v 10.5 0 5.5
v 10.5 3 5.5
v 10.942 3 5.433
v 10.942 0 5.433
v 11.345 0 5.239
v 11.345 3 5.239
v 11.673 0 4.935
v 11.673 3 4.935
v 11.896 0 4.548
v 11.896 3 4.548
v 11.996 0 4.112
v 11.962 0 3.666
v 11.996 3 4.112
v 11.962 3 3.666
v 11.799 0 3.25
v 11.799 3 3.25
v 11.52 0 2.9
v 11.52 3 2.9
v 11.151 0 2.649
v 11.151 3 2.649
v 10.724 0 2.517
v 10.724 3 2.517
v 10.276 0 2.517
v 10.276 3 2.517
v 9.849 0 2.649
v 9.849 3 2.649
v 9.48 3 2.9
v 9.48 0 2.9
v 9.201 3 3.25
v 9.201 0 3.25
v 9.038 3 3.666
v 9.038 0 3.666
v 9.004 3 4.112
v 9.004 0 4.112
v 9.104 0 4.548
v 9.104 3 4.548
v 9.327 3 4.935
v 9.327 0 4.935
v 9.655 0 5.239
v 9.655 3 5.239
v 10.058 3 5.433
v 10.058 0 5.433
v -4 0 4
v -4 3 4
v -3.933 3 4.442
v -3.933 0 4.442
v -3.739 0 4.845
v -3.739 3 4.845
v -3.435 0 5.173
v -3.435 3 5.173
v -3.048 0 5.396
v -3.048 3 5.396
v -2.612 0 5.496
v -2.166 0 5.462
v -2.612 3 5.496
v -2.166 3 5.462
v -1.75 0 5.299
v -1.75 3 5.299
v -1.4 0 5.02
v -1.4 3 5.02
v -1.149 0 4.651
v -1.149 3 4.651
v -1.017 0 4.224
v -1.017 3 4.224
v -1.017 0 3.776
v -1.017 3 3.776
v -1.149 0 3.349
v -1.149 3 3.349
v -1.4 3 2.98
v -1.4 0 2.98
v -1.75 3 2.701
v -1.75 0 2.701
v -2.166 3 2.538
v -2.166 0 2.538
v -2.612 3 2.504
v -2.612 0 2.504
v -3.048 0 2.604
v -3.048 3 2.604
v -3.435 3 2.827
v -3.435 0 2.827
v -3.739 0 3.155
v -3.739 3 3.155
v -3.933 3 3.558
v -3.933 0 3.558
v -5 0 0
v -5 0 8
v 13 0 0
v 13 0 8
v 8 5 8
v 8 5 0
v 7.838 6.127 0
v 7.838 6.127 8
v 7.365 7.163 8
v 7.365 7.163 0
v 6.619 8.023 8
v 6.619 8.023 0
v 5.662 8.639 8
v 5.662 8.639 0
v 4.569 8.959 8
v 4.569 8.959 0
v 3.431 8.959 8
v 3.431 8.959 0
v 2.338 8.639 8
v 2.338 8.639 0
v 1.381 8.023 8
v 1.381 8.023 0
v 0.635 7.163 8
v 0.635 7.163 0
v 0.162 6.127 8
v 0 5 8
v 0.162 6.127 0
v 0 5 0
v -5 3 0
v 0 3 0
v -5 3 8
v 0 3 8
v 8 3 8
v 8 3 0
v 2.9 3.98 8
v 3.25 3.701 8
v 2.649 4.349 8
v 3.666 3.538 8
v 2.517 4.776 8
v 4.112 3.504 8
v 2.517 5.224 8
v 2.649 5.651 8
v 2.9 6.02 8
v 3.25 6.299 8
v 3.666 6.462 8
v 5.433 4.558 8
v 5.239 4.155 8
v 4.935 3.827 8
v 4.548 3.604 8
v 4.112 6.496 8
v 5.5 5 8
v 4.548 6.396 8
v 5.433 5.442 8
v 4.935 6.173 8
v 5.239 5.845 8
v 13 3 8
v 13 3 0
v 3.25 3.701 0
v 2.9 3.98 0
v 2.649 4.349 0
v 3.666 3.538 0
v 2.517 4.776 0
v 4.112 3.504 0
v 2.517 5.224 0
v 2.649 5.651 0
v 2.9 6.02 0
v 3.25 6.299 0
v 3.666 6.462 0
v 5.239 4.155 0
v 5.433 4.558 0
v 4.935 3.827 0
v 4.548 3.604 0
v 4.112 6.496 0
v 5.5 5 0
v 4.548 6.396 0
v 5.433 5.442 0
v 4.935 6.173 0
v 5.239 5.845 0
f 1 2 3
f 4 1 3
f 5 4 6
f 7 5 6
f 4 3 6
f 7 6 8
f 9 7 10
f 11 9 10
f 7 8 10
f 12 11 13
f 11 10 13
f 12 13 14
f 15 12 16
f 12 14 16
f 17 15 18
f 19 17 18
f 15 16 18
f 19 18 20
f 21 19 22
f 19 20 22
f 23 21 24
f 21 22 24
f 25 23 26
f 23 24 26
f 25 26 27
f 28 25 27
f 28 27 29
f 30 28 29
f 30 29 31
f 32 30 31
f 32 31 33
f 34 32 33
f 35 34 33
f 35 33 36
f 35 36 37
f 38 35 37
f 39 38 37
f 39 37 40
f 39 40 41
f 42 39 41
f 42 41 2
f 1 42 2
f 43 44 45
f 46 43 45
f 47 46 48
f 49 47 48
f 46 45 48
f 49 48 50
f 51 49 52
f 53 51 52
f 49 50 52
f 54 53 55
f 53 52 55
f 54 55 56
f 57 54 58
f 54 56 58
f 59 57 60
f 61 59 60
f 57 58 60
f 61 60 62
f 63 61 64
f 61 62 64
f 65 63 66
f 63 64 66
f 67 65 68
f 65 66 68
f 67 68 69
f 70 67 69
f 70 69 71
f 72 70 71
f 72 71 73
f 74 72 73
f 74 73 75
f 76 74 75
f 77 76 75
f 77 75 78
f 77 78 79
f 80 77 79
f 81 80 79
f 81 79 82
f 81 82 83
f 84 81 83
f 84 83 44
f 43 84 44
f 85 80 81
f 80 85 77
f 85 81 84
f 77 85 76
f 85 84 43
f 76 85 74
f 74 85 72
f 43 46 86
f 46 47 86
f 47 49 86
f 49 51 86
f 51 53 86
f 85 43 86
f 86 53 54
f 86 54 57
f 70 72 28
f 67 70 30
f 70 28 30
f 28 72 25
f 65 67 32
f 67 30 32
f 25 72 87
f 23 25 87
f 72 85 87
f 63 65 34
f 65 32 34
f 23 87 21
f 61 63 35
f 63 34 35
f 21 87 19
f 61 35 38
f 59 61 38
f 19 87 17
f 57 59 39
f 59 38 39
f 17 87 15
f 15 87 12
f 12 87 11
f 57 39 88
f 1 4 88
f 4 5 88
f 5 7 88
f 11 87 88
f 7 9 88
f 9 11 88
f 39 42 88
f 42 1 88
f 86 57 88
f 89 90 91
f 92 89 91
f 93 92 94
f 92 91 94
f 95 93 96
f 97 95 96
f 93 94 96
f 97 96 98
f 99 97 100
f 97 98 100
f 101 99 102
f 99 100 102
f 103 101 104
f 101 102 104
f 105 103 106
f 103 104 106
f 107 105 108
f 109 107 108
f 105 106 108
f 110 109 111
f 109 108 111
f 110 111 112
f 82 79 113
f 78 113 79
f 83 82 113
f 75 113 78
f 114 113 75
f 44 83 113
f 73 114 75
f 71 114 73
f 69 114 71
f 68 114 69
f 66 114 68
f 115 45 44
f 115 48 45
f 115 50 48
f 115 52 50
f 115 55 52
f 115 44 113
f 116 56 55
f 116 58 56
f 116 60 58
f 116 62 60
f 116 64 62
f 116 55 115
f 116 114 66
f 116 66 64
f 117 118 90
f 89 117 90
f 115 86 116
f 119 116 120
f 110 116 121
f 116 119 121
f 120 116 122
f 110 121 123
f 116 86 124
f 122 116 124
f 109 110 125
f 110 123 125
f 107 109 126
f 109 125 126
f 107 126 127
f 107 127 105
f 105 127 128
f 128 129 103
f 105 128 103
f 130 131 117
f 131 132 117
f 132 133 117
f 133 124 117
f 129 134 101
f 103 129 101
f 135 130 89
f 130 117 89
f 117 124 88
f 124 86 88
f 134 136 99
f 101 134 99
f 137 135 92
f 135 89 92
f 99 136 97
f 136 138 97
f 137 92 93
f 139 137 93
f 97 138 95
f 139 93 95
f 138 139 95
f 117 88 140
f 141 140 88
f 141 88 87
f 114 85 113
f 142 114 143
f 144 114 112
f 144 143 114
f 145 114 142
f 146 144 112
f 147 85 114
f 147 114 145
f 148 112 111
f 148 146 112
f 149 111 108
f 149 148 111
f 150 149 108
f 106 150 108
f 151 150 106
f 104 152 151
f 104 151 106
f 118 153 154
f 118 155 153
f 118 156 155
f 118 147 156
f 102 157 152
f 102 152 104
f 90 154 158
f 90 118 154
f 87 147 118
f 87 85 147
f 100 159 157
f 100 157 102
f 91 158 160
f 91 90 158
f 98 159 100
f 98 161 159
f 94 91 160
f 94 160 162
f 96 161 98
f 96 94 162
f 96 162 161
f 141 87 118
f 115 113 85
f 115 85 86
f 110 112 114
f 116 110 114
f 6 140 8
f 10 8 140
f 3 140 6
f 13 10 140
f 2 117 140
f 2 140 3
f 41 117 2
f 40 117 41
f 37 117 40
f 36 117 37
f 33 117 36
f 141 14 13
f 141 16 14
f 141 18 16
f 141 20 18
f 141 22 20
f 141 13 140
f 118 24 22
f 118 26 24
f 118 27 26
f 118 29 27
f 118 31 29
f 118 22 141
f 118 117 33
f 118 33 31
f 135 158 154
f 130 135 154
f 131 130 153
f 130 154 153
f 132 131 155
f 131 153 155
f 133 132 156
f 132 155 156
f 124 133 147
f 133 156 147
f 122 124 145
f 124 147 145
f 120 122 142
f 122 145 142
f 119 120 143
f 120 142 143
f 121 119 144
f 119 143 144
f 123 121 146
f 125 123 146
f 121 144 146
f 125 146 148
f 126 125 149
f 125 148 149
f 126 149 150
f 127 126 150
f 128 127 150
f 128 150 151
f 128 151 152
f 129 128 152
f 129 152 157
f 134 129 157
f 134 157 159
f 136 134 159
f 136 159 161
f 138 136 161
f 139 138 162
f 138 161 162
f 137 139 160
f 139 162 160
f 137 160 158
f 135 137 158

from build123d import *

# Parameters (mm, degrees)
BOSS_EXTRUDE1_DEPTH = 8
SKETCH2_W           = 8
SKETCH2_H           = 3
BOSS_EXTRUDE2_DEPTH = 5
CUT_EXTRUDE1_REACH  = 18.401
SKETCH3_R           = 1.5
SKETCH4_W           = 8
SKETCH4_H           = 3
BOSS_EXTRUDE3_DEPTH = 5
CUT_EXTRUDE2_REACH  = 18.401
SKETCH5_R           = 1.5


with BuildPart() as part:
    # Sketch1 → Boss-Extrude1 (new body)
    with BuildSketch(Plane.XY):
        with BuildLine():
            ThreePointArc((8, 5), (4, 9), (0, 5))
            Line((0, 5), (2.5, 5))
            ThreePointArc((2.5, 5), (4, 6.5), (5.5, 5))
            Line((5.5, 5), (8, 5))
        make_face()
        with BuildLine():
            Line((2.5, 5), (0, 5))
            ThreePointArc((0, 5), (4, 1), (8, 5))
            Line((8, 5), (5.5, 5))
            ThreePointArc((5.5, 5), (4, 3.5), (2.5, 5))
        make_face()
        with BuildLine():
            Line((0, 5), (0, 0))
            Line((0, 0), (8, 0))
            Line((8, 0), (8, 5))
            ThreePointArc((8, 5), (4, 1), (0, 5))
        make_face()
    extrude(amount=BOSS_EXTRUDE1_DEPTH)

    # Sketch2 → Boss-Extrude2 (add)
    with BuildSketch(Plane(origin=(8, 0, 0), x_dir=(0, 0, -1), z_dir=(1, 0, 0))):
        with Locations((-4, 1.5)):
            Rectangle(SKETCH2_W, SKETCH2_H)
    extrude(amount=BOSS_EXTRUDE2_DEPTH)

    # Sketch3 → Cut-Extrude1 (cut, up to next)
    with BuildSketch(Plane(origin=(0, 3, 0), x_dir=(1, 0, 0), z_dir=(0, 1, 0)), mode=Mode.PRIVATE) as cut_extrude1_sk1:
        with Locations(Location((10.5, -4, 0), (0, 0, 270))):
            Circle(SKETCH3_R)
    cut_extrude1_tool1 = extrude(cut_extrude1_sk1.sketch, amount=-CUT_EXTRUDE1_REACH, mode=Mode.PRIVATE) & part.part
    add(cut_extrude1_tool1.solids().sort_by_distance((10.5, 3, 4))[0], mode=Mode.SUBTRACT)

    # Sketch4 → Boss-Extrude3 (add)
    with BuildSketch(Plane.ZY):
        with Locations((4, 1.5)):
            Rectangle(SKETCH4_W, SKETCH4_H)
    extrude(amount=BOSS_EXTRUDE3_DEPTH)

    # Sketch5 → Cut-Extrude2 (cut, up to next)
    with BuildSketch(Plane(origin=(0, 3, 0), x_dir=(1, 0, 0), z_dir=(0, 1, 0)), mode=Mode.PRIVATE) as cut_extrude2_sk1:
        with Locations(Location((-2.5, -4, 0), (0, 0, 180))):
            Circle(SKETCH5_R)
    cut_extrude2_tool1 = extrude(cut_extrude2_sk1.sketch, amount=-CUT_EXTRUDE2_REACH, mode=Mode.PRIVATE) & part.part
    add(cut_extrude2_tool1.solids().sort_by_distance((-2.5, 3, 4))[0], mode=Mode.SUBTRACT)


solid = part.part
